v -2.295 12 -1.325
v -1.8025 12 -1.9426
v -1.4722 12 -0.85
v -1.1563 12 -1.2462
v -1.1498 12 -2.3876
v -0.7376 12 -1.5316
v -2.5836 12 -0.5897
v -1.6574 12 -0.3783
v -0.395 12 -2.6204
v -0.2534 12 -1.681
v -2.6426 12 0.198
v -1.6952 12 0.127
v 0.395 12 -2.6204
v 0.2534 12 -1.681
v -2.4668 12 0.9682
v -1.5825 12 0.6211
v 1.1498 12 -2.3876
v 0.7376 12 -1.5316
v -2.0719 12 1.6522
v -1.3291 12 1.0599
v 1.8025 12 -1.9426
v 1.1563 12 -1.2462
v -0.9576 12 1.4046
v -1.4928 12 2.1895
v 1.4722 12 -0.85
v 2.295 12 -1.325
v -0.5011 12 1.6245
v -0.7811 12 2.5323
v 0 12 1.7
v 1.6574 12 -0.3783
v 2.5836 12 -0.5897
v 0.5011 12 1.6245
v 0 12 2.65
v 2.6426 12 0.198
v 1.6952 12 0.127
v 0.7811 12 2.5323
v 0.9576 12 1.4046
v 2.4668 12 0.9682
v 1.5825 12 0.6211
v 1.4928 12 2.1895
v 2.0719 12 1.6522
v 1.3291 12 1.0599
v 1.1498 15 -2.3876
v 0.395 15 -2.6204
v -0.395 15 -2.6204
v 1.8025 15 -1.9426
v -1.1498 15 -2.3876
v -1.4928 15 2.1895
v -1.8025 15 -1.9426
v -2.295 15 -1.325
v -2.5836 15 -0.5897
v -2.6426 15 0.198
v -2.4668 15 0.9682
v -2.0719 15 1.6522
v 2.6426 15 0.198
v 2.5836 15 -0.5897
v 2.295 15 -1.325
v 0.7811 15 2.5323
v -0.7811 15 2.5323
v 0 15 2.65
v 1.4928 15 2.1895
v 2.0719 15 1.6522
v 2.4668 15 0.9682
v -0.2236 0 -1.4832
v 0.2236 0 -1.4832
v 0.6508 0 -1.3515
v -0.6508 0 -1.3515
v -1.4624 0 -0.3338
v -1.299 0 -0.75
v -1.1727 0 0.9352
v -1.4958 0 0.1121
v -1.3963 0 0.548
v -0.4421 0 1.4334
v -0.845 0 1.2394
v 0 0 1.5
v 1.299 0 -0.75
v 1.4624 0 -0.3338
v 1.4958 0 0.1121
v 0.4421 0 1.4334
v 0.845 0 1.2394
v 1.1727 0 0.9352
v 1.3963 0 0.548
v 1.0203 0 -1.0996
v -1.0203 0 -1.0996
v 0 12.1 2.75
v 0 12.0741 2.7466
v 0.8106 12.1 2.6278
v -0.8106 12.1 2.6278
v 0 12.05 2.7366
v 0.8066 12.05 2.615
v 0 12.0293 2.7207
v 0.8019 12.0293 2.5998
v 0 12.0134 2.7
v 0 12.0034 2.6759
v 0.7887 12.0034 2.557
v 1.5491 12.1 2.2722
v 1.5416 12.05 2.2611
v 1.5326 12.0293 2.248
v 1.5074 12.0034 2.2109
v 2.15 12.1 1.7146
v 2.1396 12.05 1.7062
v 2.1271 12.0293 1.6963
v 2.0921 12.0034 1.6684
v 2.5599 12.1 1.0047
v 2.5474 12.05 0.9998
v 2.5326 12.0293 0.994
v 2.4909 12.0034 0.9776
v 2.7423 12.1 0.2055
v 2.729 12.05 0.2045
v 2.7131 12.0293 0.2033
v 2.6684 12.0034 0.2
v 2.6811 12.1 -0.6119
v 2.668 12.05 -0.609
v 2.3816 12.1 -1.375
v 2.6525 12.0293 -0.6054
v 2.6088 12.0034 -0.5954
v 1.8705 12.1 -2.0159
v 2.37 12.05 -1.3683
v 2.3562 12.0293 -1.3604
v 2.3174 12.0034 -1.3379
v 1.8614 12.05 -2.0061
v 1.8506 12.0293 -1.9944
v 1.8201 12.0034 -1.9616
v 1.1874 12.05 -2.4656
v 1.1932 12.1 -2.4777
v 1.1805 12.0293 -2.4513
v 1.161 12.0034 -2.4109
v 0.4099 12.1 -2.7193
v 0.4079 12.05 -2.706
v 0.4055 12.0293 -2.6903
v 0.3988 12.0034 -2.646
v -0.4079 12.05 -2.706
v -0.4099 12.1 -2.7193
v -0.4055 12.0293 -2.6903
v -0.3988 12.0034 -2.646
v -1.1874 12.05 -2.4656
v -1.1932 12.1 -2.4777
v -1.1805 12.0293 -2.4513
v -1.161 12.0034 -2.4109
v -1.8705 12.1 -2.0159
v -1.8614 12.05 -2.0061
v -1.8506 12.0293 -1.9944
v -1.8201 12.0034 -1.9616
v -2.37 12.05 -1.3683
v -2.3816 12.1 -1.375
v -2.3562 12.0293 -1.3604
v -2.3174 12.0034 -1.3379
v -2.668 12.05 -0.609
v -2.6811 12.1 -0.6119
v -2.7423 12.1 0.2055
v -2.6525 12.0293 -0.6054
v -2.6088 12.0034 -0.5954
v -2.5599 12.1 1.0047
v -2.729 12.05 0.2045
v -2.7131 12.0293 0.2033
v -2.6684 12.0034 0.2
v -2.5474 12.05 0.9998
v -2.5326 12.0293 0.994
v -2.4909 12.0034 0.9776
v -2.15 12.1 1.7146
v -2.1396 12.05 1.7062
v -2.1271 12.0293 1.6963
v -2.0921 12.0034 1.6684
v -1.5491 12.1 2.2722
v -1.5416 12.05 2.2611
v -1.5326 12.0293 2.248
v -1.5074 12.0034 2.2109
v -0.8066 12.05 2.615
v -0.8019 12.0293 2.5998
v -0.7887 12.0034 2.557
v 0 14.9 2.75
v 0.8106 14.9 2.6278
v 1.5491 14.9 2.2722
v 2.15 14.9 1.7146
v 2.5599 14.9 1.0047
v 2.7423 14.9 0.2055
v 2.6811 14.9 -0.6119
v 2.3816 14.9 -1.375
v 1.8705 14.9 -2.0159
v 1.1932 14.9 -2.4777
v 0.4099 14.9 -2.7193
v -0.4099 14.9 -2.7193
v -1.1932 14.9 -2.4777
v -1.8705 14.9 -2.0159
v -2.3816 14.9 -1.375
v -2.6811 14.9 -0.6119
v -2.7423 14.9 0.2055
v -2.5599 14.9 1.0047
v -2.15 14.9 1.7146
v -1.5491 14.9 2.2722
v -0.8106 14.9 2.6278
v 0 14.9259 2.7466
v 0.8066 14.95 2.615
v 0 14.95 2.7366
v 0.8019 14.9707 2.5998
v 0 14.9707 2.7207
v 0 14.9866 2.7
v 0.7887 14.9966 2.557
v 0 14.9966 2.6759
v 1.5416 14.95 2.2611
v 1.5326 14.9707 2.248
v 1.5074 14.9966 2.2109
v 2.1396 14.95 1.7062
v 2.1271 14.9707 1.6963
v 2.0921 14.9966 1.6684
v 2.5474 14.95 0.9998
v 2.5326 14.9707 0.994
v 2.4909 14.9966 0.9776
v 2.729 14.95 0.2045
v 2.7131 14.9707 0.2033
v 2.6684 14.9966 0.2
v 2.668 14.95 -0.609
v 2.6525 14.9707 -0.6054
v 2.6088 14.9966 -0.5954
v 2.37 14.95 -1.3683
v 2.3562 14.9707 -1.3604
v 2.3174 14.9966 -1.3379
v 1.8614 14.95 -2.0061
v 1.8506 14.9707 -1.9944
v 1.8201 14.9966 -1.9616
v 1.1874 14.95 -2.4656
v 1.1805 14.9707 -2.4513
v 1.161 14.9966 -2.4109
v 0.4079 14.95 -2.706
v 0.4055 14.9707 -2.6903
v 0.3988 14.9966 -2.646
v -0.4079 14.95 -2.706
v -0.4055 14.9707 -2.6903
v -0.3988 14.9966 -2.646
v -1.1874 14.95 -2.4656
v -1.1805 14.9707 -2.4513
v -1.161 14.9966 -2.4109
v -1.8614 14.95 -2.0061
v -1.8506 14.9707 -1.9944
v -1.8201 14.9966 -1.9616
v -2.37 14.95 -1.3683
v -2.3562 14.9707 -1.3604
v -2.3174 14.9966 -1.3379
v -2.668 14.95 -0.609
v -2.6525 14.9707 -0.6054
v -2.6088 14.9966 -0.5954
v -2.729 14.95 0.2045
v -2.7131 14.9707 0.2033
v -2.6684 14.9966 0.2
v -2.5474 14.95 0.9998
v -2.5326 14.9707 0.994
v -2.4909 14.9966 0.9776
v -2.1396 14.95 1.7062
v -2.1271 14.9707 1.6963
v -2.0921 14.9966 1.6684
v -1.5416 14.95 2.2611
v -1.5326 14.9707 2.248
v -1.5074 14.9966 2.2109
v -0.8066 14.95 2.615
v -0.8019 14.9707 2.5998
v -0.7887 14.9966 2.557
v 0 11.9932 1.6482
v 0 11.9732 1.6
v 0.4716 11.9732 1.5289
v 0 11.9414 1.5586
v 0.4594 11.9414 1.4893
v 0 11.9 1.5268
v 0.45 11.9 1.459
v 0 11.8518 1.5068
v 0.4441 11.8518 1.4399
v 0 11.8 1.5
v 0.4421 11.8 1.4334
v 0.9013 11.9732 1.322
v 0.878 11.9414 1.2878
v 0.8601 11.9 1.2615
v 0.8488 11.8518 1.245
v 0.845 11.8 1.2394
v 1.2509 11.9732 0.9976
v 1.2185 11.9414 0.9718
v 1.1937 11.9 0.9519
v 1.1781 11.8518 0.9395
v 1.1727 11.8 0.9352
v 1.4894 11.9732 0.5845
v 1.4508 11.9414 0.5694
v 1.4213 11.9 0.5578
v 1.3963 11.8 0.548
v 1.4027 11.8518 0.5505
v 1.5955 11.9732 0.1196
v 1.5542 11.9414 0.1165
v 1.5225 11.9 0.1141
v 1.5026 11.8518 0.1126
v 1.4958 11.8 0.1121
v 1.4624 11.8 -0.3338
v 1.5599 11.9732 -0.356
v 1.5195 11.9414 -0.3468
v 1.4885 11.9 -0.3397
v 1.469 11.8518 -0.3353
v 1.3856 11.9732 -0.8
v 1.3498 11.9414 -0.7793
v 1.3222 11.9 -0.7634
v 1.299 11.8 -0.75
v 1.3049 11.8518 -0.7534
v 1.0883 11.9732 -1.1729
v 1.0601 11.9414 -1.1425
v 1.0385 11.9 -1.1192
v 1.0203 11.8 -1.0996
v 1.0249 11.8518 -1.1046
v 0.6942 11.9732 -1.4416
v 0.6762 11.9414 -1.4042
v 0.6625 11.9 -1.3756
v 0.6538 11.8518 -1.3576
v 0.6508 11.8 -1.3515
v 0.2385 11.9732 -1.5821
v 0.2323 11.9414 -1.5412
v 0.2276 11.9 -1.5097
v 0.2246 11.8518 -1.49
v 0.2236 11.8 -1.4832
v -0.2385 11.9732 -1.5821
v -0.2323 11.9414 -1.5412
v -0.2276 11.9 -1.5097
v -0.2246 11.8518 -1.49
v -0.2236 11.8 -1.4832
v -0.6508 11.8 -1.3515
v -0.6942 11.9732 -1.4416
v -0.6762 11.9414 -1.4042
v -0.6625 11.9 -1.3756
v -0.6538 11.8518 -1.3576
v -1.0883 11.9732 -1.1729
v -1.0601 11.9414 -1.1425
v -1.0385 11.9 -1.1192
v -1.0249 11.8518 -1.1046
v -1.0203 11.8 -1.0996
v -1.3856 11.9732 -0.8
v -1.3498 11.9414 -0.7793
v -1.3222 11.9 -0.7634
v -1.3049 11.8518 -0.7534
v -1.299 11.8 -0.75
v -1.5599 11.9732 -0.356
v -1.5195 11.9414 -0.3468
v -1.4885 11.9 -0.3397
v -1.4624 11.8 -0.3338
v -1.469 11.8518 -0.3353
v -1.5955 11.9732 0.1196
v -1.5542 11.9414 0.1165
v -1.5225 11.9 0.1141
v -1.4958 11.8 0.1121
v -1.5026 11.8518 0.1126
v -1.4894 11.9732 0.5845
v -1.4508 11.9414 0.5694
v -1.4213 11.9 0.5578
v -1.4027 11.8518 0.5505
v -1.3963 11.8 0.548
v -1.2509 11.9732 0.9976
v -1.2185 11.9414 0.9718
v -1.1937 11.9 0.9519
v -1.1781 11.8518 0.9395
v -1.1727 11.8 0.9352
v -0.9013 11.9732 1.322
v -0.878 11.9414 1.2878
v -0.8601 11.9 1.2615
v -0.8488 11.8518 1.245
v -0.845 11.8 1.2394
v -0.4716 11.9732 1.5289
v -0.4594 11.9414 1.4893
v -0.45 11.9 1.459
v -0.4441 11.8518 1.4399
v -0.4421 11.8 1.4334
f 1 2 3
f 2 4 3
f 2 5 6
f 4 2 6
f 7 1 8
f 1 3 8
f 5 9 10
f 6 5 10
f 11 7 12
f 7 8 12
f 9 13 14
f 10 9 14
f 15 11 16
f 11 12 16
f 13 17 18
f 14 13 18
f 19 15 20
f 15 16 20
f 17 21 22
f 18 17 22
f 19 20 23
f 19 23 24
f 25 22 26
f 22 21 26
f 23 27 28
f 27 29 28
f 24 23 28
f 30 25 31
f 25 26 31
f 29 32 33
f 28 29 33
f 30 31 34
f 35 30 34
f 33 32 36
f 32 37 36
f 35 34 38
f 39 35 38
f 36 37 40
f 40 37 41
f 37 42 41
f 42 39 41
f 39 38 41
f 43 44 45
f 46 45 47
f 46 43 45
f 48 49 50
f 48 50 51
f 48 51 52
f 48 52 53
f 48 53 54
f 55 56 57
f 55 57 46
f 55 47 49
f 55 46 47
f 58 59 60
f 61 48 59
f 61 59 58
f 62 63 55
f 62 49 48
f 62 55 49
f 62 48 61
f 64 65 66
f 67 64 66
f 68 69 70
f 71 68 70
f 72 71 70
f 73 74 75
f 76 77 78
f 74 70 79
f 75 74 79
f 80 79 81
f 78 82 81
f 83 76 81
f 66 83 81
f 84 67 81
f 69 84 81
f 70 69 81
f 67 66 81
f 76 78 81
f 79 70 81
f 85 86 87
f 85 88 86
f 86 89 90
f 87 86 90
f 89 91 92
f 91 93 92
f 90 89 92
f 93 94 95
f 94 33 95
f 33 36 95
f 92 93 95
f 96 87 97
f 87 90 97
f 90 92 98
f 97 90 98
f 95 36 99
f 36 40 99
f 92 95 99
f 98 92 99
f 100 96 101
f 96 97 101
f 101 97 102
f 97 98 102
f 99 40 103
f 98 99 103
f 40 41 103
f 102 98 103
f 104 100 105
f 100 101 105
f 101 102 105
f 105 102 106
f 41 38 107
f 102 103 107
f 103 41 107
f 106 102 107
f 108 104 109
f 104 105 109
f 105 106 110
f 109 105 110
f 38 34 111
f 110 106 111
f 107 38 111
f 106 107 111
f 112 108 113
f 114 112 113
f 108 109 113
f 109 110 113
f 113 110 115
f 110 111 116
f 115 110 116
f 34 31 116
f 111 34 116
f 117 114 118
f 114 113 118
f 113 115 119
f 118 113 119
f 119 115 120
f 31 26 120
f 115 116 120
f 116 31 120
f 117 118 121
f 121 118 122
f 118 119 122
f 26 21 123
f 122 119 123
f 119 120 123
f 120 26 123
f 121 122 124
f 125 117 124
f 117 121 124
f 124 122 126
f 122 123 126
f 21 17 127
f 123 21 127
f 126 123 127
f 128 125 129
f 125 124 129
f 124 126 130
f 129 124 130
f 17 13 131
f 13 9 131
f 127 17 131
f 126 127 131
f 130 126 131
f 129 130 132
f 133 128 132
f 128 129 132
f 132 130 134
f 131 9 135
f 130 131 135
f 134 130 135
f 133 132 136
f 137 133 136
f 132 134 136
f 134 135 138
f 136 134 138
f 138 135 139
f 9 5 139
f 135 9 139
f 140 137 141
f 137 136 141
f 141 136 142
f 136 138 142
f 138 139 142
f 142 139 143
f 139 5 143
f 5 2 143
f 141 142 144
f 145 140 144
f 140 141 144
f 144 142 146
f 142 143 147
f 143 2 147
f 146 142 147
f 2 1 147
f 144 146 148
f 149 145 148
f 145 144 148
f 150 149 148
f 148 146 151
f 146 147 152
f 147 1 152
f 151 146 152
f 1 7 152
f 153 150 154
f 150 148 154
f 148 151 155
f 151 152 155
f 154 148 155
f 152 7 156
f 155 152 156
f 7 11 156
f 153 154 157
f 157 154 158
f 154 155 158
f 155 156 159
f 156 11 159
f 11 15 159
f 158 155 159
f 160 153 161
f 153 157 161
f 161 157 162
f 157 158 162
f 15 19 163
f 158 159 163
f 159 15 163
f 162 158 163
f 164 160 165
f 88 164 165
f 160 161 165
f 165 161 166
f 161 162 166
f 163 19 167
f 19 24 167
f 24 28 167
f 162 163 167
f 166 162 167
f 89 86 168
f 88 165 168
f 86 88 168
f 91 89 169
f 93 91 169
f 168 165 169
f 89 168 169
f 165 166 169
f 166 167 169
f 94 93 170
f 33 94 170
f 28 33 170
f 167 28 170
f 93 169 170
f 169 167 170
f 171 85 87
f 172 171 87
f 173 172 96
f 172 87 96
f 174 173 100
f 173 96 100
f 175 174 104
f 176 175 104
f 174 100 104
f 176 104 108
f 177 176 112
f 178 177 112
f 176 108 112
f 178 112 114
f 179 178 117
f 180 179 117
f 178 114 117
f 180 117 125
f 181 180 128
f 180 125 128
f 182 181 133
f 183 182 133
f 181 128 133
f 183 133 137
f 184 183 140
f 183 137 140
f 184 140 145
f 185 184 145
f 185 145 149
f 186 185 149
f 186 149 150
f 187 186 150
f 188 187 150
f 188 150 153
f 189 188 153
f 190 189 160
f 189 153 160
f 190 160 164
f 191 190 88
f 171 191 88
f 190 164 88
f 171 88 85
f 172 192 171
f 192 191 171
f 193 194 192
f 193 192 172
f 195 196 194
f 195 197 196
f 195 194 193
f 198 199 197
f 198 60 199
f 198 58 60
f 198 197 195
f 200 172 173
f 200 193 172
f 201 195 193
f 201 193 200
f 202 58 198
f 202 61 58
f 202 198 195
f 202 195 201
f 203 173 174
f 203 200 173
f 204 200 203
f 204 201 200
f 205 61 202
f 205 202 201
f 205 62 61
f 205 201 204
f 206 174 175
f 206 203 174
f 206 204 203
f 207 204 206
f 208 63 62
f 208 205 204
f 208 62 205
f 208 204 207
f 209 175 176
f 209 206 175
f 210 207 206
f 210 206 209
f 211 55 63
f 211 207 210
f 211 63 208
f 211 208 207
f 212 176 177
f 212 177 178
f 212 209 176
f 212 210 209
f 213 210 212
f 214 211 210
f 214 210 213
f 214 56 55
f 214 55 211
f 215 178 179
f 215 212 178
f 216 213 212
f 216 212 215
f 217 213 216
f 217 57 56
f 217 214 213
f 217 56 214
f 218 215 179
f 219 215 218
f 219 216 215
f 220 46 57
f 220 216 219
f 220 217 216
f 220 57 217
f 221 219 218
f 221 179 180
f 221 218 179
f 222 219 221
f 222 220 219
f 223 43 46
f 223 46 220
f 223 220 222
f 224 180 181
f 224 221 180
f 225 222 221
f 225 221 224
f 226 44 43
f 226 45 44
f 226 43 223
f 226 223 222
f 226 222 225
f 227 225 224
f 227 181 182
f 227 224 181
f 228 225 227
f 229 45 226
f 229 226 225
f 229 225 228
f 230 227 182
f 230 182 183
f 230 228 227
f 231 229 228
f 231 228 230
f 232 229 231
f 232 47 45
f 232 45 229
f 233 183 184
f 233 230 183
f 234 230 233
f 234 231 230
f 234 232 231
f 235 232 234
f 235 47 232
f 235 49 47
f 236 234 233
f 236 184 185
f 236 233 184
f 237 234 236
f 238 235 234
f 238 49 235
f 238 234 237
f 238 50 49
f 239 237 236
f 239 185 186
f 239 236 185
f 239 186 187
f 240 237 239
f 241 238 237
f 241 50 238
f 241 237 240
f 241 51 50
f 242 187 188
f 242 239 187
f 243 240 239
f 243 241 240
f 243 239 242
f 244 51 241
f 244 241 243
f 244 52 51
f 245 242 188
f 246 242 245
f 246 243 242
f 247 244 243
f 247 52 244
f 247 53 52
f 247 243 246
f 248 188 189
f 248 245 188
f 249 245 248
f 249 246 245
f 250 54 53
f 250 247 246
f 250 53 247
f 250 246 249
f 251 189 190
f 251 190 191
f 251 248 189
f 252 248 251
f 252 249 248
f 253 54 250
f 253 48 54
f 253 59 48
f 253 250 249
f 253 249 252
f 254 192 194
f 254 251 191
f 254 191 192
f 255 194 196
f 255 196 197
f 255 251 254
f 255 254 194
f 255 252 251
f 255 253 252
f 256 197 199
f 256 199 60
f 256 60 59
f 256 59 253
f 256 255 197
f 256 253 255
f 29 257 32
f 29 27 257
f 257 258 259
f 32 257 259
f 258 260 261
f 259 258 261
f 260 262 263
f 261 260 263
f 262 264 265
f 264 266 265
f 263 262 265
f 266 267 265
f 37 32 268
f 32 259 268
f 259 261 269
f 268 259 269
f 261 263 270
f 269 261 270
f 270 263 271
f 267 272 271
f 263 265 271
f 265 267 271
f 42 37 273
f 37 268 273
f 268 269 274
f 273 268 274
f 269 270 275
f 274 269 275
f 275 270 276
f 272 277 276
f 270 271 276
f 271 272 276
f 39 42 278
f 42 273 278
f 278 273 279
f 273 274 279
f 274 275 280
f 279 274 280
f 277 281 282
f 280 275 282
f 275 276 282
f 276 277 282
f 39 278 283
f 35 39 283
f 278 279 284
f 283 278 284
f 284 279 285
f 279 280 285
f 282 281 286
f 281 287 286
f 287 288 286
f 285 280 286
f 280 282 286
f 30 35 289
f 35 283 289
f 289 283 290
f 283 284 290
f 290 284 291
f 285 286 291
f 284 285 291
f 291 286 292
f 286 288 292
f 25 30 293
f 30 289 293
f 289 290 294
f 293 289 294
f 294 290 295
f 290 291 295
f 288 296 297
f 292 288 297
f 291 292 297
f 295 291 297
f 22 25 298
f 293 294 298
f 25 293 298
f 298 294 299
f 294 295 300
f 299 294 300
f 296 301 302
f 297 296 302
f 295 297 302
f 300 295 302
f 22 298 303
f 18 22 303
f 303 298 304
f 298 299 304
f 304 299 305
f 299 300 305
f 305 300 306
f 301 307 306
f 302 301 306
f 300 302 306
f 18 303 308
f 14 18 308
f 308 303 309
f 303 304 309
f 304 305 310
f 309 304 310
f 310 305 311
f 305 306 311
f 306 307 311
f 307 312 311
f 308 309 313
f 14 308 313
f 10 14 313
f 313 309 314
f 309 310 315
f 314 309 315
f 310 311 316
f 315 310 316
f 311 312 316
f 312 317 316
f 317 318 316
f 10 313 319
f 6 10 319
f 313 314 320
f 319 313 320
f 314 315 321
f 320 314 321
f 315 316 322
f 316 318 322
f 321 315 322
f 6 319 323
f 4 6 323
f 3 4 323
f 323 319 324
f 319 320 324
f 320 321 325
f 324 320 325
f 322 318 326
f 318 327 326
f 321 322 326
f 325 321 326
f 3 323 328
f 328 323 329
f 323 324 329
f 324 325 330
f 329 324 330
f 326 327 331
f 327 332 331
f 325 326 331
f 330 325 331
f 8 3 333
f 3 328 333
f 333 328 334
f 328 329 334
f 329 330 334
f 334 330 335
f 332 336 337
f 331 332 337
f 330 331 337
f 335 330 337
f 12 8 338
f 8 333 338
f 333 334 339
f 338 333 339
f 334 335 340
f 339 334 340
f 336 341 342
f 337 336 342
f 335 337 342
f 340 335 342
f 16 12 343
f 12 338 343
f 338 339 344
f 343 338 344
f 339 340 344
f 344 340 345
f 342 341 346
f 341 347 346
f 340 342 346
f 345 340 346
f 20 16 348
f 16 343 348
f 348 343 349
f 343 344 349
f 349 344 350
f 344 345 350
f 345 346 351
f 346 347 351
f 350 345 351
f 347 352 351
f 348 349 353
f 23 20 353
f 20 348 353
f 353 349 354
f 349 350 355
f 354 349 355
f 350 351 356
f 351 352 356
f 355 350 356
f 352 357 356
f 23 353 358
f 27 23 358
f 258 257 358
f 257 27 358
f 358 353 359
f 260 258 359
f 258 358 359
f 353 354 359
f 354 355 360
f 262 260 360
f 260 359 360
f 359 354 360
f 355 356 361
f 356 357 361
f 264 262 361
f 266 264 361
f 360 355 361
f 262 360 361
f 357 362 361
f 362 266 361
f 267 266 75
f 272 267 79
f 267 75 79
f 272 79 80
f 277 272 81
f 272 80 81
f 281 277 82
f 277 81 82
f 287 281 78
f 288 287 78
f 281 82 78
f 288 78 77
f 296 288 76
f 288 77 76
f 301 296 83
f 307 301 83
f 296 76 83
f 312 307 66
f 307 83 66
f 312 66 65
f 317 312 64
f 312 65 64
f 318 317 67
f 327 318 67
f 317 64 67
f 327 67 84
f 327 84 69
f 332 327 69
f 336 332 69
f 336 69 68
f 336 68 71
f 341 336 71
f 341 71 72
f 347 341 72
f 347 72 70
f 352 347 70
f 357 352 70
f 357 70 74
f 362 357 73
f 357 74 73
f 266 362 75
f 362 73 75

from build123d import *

# Parameters (mm, degrees)
SKETCH1_R           = 1.5
BOSS_EXTRUDE1_DEPTH = 12
SKETCH2_R           = 2.75
BOSS_EXTRUDE2_DEPTH = 3
FILLET1_R           = 0.2
FILLET2_R           = 0.1
FILLET3_R           = 0.1


with BuildPart() as part:
    # Sketch1 → Boss-Extrude1 (new body)
    with BuildSketch(Plane(origin=(0, 0, 0), x_dir=(1, 0, 0), z_dir=(0, 1, 0))):
        with Locations(Location((0, 0, 0), (0, 0, 270))):
            Circle(SKETCH1_R)
    extrude(amount=BOSS_EXTRUDE1_DEPTH)

    # Sketch2 → Boss-Extrude2 (add)
    with BuildSketch(Plane(origin=(0, 12, 0), x_dir=(1, 0, 0), z_dir=(0, 1, 0))):
        with Locations(Location((0, 0, 0), (0, 0, 270))):
            Circle(SKETCH2_R)
    extrude(amount=BOSS_EXTRUDE2_DEPTH)

    # Fillet1
    fillet1_edges = [part.edges().sort_by_distance(p)[0] for p in [
        (0, 12, -1.5),
    ]]
    fillet(fillet1_edges, radius=FILLET1_R)

    # Fillet2
    fillet2_edges = [part.edges().sort_by_distance(p)[0] for p in [
        (0, 15, -2.75),
    ]]
    fillet(fillet2_edges, radius=FILLET2_R)

    # Fillet3
    fillet3_edges = [part.edges().sort_by_distance(p)[0] for p in [
        (0, 12, -2.75),
    ]]
    fillet(fillet3_edges, radius=FILLET3_R)


solid = part.part
